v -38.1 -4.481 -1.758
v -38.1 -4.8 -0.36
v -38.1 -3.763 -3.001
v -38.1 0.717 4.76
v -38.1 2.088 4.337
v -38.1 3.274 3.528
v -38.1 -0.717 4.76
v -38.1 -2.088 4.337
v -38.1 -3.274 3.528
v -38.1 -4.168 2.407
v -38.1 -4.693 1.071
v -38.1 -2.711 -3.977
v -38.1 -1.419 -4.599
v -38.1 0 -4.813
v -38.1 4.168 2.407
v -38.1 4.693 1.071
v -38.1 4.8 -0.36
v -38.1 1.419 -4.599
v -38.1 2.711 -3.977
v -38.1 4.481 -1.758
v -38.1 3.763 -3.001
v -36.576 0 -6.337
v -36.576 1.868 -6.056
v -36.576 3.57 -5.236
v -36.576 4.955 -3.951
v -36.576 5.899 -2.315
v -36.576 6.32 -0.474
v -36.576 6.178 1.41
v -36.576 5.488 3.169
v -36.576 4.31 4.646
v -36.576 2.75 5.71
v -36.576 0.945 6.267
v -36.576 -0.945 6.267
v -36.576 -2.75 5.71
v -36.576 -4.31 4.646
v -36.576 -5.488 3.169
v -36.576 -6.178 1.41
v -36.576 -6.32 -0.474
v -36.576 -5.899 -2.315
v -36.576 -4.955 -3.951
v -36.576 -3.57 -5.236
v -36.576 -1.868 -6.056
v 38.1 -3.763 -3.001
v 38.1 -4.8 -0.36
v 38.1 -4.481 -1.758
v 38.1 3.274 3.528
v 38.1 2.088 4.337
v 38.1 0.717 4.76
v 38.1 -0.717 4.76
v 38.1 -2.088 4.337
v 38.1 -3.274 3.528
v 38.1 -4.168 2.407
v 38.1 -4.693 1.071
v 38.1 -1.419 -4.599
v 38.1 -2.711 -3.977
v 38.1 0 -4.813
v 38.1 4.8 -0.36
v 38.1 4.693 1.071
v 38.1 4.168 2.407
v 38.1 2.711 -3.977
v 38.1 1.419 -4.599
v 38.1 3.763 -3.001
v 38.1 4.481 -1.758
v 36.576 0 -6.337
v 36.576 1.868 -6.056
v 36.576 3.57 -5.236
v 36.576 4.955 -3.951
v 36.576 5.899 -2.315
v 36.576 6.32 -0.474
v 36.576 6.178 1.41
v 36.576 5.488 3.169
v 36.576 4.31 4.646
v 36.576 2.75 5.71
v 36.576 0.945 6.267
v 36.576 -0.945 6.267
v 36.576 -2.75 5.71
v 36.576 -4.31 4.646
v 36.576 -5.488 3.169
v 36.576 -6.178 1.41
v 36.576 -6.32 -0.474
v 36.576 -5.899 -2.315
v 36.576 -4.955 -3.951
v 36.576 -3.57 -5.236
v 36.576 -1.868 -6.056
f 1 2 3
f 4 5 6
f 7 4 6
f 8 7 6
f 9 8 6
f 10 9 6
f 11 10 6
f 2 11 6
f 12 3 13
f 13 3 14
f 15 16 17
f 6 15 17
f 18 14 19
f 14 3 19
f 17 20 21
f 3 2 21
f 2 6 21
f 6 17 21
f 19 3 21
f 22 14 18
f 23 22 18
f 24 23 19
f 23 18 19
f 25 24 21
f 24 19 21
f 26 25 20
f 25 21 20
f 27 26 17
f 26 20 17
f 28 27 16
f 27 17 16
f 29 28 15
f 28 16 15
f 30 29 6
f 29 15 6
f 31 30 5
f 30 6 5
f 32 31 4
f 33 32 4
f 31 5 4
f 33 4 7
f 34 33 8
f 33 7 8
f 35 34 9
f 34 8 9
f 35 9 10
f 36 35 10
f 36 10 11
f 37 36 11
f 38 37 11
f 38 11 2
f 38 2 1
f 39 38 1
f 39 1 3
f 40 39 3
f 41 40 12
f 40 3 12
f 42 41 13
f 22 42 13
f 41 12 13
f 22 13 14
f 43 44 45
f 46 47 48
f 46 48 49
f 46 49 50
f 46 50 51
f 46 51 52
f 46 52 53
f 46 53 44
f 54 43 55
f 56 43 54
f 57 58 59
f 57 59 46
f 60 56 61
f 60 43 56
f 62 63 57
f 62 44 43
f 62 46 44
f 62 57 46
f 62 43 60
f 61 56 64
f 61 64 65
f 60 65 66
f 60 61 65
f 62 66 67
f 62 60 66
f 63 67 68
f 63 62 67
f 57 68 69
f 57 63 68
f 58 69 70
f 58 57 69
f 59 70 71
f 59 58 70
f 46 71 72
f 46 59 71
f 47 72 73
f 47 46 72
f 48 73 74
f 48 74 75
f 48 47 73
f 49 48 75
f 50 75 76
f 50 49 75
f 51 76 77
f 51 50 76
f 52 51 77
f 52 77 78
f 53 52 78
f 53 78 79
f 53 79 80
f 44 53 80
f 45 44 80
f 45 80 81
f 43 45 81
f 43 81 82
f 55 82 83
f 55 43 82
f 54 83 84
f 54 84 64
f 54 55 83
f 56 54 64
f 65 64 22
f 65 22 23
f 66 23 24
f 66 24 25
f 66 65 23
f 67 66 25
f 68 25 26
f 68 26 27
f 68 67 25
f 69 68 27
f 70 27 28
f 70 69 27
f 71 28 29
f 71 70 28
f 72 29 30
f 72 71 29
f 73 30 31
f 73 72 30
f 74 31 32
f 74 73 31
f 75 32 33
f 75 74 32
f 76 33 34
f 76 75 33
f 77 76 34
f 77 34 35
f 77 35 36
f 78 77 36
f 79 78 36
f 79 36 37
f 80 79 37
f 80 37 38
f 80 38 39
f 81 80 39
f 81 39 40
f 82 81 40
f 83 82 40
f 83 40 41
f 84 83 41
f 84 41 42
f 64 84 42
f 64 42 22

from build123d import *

# Parameters (mm, degrees)
SKETCH1_R           = 6.3373
BOSS_EXTRUDE1_DEPTH = 38.1
CHAMFER1_SIZE       = 1.524
CHAMFER2_SIZE       = 1.524


with BuildPart() as part:
    # Sketch1 → Boss-Extrude1 (new body, symmetric)
    with BuildSketch(Plane(origin=(0, 0, 0), x_dir=(0, 0, -1), z_dir=(1, 0, 0))):
        Circle(SKETCH1_R)
    extrude(amount=BOSS_EXTRUDE1_DEPTH, both=True)

    # Chamfer1
    chamfer1_edges = [part.edges().sort_by_distance(p)[0] for p in [
        (38.1, 0, 6.3373),
    ]]
    chamfer(chamfer1_edges, length=CHAMFER1_SIZE)

    # Chamfer2
    chamfer2_edges = [part.edges().sort_by_distance(p)[0] for p in [
        (-38.1, 0, 6.3373),
    ]]
    chamfer(chamfer2_edges, length=CHAMFER2_SIZE)


solid = part.part
